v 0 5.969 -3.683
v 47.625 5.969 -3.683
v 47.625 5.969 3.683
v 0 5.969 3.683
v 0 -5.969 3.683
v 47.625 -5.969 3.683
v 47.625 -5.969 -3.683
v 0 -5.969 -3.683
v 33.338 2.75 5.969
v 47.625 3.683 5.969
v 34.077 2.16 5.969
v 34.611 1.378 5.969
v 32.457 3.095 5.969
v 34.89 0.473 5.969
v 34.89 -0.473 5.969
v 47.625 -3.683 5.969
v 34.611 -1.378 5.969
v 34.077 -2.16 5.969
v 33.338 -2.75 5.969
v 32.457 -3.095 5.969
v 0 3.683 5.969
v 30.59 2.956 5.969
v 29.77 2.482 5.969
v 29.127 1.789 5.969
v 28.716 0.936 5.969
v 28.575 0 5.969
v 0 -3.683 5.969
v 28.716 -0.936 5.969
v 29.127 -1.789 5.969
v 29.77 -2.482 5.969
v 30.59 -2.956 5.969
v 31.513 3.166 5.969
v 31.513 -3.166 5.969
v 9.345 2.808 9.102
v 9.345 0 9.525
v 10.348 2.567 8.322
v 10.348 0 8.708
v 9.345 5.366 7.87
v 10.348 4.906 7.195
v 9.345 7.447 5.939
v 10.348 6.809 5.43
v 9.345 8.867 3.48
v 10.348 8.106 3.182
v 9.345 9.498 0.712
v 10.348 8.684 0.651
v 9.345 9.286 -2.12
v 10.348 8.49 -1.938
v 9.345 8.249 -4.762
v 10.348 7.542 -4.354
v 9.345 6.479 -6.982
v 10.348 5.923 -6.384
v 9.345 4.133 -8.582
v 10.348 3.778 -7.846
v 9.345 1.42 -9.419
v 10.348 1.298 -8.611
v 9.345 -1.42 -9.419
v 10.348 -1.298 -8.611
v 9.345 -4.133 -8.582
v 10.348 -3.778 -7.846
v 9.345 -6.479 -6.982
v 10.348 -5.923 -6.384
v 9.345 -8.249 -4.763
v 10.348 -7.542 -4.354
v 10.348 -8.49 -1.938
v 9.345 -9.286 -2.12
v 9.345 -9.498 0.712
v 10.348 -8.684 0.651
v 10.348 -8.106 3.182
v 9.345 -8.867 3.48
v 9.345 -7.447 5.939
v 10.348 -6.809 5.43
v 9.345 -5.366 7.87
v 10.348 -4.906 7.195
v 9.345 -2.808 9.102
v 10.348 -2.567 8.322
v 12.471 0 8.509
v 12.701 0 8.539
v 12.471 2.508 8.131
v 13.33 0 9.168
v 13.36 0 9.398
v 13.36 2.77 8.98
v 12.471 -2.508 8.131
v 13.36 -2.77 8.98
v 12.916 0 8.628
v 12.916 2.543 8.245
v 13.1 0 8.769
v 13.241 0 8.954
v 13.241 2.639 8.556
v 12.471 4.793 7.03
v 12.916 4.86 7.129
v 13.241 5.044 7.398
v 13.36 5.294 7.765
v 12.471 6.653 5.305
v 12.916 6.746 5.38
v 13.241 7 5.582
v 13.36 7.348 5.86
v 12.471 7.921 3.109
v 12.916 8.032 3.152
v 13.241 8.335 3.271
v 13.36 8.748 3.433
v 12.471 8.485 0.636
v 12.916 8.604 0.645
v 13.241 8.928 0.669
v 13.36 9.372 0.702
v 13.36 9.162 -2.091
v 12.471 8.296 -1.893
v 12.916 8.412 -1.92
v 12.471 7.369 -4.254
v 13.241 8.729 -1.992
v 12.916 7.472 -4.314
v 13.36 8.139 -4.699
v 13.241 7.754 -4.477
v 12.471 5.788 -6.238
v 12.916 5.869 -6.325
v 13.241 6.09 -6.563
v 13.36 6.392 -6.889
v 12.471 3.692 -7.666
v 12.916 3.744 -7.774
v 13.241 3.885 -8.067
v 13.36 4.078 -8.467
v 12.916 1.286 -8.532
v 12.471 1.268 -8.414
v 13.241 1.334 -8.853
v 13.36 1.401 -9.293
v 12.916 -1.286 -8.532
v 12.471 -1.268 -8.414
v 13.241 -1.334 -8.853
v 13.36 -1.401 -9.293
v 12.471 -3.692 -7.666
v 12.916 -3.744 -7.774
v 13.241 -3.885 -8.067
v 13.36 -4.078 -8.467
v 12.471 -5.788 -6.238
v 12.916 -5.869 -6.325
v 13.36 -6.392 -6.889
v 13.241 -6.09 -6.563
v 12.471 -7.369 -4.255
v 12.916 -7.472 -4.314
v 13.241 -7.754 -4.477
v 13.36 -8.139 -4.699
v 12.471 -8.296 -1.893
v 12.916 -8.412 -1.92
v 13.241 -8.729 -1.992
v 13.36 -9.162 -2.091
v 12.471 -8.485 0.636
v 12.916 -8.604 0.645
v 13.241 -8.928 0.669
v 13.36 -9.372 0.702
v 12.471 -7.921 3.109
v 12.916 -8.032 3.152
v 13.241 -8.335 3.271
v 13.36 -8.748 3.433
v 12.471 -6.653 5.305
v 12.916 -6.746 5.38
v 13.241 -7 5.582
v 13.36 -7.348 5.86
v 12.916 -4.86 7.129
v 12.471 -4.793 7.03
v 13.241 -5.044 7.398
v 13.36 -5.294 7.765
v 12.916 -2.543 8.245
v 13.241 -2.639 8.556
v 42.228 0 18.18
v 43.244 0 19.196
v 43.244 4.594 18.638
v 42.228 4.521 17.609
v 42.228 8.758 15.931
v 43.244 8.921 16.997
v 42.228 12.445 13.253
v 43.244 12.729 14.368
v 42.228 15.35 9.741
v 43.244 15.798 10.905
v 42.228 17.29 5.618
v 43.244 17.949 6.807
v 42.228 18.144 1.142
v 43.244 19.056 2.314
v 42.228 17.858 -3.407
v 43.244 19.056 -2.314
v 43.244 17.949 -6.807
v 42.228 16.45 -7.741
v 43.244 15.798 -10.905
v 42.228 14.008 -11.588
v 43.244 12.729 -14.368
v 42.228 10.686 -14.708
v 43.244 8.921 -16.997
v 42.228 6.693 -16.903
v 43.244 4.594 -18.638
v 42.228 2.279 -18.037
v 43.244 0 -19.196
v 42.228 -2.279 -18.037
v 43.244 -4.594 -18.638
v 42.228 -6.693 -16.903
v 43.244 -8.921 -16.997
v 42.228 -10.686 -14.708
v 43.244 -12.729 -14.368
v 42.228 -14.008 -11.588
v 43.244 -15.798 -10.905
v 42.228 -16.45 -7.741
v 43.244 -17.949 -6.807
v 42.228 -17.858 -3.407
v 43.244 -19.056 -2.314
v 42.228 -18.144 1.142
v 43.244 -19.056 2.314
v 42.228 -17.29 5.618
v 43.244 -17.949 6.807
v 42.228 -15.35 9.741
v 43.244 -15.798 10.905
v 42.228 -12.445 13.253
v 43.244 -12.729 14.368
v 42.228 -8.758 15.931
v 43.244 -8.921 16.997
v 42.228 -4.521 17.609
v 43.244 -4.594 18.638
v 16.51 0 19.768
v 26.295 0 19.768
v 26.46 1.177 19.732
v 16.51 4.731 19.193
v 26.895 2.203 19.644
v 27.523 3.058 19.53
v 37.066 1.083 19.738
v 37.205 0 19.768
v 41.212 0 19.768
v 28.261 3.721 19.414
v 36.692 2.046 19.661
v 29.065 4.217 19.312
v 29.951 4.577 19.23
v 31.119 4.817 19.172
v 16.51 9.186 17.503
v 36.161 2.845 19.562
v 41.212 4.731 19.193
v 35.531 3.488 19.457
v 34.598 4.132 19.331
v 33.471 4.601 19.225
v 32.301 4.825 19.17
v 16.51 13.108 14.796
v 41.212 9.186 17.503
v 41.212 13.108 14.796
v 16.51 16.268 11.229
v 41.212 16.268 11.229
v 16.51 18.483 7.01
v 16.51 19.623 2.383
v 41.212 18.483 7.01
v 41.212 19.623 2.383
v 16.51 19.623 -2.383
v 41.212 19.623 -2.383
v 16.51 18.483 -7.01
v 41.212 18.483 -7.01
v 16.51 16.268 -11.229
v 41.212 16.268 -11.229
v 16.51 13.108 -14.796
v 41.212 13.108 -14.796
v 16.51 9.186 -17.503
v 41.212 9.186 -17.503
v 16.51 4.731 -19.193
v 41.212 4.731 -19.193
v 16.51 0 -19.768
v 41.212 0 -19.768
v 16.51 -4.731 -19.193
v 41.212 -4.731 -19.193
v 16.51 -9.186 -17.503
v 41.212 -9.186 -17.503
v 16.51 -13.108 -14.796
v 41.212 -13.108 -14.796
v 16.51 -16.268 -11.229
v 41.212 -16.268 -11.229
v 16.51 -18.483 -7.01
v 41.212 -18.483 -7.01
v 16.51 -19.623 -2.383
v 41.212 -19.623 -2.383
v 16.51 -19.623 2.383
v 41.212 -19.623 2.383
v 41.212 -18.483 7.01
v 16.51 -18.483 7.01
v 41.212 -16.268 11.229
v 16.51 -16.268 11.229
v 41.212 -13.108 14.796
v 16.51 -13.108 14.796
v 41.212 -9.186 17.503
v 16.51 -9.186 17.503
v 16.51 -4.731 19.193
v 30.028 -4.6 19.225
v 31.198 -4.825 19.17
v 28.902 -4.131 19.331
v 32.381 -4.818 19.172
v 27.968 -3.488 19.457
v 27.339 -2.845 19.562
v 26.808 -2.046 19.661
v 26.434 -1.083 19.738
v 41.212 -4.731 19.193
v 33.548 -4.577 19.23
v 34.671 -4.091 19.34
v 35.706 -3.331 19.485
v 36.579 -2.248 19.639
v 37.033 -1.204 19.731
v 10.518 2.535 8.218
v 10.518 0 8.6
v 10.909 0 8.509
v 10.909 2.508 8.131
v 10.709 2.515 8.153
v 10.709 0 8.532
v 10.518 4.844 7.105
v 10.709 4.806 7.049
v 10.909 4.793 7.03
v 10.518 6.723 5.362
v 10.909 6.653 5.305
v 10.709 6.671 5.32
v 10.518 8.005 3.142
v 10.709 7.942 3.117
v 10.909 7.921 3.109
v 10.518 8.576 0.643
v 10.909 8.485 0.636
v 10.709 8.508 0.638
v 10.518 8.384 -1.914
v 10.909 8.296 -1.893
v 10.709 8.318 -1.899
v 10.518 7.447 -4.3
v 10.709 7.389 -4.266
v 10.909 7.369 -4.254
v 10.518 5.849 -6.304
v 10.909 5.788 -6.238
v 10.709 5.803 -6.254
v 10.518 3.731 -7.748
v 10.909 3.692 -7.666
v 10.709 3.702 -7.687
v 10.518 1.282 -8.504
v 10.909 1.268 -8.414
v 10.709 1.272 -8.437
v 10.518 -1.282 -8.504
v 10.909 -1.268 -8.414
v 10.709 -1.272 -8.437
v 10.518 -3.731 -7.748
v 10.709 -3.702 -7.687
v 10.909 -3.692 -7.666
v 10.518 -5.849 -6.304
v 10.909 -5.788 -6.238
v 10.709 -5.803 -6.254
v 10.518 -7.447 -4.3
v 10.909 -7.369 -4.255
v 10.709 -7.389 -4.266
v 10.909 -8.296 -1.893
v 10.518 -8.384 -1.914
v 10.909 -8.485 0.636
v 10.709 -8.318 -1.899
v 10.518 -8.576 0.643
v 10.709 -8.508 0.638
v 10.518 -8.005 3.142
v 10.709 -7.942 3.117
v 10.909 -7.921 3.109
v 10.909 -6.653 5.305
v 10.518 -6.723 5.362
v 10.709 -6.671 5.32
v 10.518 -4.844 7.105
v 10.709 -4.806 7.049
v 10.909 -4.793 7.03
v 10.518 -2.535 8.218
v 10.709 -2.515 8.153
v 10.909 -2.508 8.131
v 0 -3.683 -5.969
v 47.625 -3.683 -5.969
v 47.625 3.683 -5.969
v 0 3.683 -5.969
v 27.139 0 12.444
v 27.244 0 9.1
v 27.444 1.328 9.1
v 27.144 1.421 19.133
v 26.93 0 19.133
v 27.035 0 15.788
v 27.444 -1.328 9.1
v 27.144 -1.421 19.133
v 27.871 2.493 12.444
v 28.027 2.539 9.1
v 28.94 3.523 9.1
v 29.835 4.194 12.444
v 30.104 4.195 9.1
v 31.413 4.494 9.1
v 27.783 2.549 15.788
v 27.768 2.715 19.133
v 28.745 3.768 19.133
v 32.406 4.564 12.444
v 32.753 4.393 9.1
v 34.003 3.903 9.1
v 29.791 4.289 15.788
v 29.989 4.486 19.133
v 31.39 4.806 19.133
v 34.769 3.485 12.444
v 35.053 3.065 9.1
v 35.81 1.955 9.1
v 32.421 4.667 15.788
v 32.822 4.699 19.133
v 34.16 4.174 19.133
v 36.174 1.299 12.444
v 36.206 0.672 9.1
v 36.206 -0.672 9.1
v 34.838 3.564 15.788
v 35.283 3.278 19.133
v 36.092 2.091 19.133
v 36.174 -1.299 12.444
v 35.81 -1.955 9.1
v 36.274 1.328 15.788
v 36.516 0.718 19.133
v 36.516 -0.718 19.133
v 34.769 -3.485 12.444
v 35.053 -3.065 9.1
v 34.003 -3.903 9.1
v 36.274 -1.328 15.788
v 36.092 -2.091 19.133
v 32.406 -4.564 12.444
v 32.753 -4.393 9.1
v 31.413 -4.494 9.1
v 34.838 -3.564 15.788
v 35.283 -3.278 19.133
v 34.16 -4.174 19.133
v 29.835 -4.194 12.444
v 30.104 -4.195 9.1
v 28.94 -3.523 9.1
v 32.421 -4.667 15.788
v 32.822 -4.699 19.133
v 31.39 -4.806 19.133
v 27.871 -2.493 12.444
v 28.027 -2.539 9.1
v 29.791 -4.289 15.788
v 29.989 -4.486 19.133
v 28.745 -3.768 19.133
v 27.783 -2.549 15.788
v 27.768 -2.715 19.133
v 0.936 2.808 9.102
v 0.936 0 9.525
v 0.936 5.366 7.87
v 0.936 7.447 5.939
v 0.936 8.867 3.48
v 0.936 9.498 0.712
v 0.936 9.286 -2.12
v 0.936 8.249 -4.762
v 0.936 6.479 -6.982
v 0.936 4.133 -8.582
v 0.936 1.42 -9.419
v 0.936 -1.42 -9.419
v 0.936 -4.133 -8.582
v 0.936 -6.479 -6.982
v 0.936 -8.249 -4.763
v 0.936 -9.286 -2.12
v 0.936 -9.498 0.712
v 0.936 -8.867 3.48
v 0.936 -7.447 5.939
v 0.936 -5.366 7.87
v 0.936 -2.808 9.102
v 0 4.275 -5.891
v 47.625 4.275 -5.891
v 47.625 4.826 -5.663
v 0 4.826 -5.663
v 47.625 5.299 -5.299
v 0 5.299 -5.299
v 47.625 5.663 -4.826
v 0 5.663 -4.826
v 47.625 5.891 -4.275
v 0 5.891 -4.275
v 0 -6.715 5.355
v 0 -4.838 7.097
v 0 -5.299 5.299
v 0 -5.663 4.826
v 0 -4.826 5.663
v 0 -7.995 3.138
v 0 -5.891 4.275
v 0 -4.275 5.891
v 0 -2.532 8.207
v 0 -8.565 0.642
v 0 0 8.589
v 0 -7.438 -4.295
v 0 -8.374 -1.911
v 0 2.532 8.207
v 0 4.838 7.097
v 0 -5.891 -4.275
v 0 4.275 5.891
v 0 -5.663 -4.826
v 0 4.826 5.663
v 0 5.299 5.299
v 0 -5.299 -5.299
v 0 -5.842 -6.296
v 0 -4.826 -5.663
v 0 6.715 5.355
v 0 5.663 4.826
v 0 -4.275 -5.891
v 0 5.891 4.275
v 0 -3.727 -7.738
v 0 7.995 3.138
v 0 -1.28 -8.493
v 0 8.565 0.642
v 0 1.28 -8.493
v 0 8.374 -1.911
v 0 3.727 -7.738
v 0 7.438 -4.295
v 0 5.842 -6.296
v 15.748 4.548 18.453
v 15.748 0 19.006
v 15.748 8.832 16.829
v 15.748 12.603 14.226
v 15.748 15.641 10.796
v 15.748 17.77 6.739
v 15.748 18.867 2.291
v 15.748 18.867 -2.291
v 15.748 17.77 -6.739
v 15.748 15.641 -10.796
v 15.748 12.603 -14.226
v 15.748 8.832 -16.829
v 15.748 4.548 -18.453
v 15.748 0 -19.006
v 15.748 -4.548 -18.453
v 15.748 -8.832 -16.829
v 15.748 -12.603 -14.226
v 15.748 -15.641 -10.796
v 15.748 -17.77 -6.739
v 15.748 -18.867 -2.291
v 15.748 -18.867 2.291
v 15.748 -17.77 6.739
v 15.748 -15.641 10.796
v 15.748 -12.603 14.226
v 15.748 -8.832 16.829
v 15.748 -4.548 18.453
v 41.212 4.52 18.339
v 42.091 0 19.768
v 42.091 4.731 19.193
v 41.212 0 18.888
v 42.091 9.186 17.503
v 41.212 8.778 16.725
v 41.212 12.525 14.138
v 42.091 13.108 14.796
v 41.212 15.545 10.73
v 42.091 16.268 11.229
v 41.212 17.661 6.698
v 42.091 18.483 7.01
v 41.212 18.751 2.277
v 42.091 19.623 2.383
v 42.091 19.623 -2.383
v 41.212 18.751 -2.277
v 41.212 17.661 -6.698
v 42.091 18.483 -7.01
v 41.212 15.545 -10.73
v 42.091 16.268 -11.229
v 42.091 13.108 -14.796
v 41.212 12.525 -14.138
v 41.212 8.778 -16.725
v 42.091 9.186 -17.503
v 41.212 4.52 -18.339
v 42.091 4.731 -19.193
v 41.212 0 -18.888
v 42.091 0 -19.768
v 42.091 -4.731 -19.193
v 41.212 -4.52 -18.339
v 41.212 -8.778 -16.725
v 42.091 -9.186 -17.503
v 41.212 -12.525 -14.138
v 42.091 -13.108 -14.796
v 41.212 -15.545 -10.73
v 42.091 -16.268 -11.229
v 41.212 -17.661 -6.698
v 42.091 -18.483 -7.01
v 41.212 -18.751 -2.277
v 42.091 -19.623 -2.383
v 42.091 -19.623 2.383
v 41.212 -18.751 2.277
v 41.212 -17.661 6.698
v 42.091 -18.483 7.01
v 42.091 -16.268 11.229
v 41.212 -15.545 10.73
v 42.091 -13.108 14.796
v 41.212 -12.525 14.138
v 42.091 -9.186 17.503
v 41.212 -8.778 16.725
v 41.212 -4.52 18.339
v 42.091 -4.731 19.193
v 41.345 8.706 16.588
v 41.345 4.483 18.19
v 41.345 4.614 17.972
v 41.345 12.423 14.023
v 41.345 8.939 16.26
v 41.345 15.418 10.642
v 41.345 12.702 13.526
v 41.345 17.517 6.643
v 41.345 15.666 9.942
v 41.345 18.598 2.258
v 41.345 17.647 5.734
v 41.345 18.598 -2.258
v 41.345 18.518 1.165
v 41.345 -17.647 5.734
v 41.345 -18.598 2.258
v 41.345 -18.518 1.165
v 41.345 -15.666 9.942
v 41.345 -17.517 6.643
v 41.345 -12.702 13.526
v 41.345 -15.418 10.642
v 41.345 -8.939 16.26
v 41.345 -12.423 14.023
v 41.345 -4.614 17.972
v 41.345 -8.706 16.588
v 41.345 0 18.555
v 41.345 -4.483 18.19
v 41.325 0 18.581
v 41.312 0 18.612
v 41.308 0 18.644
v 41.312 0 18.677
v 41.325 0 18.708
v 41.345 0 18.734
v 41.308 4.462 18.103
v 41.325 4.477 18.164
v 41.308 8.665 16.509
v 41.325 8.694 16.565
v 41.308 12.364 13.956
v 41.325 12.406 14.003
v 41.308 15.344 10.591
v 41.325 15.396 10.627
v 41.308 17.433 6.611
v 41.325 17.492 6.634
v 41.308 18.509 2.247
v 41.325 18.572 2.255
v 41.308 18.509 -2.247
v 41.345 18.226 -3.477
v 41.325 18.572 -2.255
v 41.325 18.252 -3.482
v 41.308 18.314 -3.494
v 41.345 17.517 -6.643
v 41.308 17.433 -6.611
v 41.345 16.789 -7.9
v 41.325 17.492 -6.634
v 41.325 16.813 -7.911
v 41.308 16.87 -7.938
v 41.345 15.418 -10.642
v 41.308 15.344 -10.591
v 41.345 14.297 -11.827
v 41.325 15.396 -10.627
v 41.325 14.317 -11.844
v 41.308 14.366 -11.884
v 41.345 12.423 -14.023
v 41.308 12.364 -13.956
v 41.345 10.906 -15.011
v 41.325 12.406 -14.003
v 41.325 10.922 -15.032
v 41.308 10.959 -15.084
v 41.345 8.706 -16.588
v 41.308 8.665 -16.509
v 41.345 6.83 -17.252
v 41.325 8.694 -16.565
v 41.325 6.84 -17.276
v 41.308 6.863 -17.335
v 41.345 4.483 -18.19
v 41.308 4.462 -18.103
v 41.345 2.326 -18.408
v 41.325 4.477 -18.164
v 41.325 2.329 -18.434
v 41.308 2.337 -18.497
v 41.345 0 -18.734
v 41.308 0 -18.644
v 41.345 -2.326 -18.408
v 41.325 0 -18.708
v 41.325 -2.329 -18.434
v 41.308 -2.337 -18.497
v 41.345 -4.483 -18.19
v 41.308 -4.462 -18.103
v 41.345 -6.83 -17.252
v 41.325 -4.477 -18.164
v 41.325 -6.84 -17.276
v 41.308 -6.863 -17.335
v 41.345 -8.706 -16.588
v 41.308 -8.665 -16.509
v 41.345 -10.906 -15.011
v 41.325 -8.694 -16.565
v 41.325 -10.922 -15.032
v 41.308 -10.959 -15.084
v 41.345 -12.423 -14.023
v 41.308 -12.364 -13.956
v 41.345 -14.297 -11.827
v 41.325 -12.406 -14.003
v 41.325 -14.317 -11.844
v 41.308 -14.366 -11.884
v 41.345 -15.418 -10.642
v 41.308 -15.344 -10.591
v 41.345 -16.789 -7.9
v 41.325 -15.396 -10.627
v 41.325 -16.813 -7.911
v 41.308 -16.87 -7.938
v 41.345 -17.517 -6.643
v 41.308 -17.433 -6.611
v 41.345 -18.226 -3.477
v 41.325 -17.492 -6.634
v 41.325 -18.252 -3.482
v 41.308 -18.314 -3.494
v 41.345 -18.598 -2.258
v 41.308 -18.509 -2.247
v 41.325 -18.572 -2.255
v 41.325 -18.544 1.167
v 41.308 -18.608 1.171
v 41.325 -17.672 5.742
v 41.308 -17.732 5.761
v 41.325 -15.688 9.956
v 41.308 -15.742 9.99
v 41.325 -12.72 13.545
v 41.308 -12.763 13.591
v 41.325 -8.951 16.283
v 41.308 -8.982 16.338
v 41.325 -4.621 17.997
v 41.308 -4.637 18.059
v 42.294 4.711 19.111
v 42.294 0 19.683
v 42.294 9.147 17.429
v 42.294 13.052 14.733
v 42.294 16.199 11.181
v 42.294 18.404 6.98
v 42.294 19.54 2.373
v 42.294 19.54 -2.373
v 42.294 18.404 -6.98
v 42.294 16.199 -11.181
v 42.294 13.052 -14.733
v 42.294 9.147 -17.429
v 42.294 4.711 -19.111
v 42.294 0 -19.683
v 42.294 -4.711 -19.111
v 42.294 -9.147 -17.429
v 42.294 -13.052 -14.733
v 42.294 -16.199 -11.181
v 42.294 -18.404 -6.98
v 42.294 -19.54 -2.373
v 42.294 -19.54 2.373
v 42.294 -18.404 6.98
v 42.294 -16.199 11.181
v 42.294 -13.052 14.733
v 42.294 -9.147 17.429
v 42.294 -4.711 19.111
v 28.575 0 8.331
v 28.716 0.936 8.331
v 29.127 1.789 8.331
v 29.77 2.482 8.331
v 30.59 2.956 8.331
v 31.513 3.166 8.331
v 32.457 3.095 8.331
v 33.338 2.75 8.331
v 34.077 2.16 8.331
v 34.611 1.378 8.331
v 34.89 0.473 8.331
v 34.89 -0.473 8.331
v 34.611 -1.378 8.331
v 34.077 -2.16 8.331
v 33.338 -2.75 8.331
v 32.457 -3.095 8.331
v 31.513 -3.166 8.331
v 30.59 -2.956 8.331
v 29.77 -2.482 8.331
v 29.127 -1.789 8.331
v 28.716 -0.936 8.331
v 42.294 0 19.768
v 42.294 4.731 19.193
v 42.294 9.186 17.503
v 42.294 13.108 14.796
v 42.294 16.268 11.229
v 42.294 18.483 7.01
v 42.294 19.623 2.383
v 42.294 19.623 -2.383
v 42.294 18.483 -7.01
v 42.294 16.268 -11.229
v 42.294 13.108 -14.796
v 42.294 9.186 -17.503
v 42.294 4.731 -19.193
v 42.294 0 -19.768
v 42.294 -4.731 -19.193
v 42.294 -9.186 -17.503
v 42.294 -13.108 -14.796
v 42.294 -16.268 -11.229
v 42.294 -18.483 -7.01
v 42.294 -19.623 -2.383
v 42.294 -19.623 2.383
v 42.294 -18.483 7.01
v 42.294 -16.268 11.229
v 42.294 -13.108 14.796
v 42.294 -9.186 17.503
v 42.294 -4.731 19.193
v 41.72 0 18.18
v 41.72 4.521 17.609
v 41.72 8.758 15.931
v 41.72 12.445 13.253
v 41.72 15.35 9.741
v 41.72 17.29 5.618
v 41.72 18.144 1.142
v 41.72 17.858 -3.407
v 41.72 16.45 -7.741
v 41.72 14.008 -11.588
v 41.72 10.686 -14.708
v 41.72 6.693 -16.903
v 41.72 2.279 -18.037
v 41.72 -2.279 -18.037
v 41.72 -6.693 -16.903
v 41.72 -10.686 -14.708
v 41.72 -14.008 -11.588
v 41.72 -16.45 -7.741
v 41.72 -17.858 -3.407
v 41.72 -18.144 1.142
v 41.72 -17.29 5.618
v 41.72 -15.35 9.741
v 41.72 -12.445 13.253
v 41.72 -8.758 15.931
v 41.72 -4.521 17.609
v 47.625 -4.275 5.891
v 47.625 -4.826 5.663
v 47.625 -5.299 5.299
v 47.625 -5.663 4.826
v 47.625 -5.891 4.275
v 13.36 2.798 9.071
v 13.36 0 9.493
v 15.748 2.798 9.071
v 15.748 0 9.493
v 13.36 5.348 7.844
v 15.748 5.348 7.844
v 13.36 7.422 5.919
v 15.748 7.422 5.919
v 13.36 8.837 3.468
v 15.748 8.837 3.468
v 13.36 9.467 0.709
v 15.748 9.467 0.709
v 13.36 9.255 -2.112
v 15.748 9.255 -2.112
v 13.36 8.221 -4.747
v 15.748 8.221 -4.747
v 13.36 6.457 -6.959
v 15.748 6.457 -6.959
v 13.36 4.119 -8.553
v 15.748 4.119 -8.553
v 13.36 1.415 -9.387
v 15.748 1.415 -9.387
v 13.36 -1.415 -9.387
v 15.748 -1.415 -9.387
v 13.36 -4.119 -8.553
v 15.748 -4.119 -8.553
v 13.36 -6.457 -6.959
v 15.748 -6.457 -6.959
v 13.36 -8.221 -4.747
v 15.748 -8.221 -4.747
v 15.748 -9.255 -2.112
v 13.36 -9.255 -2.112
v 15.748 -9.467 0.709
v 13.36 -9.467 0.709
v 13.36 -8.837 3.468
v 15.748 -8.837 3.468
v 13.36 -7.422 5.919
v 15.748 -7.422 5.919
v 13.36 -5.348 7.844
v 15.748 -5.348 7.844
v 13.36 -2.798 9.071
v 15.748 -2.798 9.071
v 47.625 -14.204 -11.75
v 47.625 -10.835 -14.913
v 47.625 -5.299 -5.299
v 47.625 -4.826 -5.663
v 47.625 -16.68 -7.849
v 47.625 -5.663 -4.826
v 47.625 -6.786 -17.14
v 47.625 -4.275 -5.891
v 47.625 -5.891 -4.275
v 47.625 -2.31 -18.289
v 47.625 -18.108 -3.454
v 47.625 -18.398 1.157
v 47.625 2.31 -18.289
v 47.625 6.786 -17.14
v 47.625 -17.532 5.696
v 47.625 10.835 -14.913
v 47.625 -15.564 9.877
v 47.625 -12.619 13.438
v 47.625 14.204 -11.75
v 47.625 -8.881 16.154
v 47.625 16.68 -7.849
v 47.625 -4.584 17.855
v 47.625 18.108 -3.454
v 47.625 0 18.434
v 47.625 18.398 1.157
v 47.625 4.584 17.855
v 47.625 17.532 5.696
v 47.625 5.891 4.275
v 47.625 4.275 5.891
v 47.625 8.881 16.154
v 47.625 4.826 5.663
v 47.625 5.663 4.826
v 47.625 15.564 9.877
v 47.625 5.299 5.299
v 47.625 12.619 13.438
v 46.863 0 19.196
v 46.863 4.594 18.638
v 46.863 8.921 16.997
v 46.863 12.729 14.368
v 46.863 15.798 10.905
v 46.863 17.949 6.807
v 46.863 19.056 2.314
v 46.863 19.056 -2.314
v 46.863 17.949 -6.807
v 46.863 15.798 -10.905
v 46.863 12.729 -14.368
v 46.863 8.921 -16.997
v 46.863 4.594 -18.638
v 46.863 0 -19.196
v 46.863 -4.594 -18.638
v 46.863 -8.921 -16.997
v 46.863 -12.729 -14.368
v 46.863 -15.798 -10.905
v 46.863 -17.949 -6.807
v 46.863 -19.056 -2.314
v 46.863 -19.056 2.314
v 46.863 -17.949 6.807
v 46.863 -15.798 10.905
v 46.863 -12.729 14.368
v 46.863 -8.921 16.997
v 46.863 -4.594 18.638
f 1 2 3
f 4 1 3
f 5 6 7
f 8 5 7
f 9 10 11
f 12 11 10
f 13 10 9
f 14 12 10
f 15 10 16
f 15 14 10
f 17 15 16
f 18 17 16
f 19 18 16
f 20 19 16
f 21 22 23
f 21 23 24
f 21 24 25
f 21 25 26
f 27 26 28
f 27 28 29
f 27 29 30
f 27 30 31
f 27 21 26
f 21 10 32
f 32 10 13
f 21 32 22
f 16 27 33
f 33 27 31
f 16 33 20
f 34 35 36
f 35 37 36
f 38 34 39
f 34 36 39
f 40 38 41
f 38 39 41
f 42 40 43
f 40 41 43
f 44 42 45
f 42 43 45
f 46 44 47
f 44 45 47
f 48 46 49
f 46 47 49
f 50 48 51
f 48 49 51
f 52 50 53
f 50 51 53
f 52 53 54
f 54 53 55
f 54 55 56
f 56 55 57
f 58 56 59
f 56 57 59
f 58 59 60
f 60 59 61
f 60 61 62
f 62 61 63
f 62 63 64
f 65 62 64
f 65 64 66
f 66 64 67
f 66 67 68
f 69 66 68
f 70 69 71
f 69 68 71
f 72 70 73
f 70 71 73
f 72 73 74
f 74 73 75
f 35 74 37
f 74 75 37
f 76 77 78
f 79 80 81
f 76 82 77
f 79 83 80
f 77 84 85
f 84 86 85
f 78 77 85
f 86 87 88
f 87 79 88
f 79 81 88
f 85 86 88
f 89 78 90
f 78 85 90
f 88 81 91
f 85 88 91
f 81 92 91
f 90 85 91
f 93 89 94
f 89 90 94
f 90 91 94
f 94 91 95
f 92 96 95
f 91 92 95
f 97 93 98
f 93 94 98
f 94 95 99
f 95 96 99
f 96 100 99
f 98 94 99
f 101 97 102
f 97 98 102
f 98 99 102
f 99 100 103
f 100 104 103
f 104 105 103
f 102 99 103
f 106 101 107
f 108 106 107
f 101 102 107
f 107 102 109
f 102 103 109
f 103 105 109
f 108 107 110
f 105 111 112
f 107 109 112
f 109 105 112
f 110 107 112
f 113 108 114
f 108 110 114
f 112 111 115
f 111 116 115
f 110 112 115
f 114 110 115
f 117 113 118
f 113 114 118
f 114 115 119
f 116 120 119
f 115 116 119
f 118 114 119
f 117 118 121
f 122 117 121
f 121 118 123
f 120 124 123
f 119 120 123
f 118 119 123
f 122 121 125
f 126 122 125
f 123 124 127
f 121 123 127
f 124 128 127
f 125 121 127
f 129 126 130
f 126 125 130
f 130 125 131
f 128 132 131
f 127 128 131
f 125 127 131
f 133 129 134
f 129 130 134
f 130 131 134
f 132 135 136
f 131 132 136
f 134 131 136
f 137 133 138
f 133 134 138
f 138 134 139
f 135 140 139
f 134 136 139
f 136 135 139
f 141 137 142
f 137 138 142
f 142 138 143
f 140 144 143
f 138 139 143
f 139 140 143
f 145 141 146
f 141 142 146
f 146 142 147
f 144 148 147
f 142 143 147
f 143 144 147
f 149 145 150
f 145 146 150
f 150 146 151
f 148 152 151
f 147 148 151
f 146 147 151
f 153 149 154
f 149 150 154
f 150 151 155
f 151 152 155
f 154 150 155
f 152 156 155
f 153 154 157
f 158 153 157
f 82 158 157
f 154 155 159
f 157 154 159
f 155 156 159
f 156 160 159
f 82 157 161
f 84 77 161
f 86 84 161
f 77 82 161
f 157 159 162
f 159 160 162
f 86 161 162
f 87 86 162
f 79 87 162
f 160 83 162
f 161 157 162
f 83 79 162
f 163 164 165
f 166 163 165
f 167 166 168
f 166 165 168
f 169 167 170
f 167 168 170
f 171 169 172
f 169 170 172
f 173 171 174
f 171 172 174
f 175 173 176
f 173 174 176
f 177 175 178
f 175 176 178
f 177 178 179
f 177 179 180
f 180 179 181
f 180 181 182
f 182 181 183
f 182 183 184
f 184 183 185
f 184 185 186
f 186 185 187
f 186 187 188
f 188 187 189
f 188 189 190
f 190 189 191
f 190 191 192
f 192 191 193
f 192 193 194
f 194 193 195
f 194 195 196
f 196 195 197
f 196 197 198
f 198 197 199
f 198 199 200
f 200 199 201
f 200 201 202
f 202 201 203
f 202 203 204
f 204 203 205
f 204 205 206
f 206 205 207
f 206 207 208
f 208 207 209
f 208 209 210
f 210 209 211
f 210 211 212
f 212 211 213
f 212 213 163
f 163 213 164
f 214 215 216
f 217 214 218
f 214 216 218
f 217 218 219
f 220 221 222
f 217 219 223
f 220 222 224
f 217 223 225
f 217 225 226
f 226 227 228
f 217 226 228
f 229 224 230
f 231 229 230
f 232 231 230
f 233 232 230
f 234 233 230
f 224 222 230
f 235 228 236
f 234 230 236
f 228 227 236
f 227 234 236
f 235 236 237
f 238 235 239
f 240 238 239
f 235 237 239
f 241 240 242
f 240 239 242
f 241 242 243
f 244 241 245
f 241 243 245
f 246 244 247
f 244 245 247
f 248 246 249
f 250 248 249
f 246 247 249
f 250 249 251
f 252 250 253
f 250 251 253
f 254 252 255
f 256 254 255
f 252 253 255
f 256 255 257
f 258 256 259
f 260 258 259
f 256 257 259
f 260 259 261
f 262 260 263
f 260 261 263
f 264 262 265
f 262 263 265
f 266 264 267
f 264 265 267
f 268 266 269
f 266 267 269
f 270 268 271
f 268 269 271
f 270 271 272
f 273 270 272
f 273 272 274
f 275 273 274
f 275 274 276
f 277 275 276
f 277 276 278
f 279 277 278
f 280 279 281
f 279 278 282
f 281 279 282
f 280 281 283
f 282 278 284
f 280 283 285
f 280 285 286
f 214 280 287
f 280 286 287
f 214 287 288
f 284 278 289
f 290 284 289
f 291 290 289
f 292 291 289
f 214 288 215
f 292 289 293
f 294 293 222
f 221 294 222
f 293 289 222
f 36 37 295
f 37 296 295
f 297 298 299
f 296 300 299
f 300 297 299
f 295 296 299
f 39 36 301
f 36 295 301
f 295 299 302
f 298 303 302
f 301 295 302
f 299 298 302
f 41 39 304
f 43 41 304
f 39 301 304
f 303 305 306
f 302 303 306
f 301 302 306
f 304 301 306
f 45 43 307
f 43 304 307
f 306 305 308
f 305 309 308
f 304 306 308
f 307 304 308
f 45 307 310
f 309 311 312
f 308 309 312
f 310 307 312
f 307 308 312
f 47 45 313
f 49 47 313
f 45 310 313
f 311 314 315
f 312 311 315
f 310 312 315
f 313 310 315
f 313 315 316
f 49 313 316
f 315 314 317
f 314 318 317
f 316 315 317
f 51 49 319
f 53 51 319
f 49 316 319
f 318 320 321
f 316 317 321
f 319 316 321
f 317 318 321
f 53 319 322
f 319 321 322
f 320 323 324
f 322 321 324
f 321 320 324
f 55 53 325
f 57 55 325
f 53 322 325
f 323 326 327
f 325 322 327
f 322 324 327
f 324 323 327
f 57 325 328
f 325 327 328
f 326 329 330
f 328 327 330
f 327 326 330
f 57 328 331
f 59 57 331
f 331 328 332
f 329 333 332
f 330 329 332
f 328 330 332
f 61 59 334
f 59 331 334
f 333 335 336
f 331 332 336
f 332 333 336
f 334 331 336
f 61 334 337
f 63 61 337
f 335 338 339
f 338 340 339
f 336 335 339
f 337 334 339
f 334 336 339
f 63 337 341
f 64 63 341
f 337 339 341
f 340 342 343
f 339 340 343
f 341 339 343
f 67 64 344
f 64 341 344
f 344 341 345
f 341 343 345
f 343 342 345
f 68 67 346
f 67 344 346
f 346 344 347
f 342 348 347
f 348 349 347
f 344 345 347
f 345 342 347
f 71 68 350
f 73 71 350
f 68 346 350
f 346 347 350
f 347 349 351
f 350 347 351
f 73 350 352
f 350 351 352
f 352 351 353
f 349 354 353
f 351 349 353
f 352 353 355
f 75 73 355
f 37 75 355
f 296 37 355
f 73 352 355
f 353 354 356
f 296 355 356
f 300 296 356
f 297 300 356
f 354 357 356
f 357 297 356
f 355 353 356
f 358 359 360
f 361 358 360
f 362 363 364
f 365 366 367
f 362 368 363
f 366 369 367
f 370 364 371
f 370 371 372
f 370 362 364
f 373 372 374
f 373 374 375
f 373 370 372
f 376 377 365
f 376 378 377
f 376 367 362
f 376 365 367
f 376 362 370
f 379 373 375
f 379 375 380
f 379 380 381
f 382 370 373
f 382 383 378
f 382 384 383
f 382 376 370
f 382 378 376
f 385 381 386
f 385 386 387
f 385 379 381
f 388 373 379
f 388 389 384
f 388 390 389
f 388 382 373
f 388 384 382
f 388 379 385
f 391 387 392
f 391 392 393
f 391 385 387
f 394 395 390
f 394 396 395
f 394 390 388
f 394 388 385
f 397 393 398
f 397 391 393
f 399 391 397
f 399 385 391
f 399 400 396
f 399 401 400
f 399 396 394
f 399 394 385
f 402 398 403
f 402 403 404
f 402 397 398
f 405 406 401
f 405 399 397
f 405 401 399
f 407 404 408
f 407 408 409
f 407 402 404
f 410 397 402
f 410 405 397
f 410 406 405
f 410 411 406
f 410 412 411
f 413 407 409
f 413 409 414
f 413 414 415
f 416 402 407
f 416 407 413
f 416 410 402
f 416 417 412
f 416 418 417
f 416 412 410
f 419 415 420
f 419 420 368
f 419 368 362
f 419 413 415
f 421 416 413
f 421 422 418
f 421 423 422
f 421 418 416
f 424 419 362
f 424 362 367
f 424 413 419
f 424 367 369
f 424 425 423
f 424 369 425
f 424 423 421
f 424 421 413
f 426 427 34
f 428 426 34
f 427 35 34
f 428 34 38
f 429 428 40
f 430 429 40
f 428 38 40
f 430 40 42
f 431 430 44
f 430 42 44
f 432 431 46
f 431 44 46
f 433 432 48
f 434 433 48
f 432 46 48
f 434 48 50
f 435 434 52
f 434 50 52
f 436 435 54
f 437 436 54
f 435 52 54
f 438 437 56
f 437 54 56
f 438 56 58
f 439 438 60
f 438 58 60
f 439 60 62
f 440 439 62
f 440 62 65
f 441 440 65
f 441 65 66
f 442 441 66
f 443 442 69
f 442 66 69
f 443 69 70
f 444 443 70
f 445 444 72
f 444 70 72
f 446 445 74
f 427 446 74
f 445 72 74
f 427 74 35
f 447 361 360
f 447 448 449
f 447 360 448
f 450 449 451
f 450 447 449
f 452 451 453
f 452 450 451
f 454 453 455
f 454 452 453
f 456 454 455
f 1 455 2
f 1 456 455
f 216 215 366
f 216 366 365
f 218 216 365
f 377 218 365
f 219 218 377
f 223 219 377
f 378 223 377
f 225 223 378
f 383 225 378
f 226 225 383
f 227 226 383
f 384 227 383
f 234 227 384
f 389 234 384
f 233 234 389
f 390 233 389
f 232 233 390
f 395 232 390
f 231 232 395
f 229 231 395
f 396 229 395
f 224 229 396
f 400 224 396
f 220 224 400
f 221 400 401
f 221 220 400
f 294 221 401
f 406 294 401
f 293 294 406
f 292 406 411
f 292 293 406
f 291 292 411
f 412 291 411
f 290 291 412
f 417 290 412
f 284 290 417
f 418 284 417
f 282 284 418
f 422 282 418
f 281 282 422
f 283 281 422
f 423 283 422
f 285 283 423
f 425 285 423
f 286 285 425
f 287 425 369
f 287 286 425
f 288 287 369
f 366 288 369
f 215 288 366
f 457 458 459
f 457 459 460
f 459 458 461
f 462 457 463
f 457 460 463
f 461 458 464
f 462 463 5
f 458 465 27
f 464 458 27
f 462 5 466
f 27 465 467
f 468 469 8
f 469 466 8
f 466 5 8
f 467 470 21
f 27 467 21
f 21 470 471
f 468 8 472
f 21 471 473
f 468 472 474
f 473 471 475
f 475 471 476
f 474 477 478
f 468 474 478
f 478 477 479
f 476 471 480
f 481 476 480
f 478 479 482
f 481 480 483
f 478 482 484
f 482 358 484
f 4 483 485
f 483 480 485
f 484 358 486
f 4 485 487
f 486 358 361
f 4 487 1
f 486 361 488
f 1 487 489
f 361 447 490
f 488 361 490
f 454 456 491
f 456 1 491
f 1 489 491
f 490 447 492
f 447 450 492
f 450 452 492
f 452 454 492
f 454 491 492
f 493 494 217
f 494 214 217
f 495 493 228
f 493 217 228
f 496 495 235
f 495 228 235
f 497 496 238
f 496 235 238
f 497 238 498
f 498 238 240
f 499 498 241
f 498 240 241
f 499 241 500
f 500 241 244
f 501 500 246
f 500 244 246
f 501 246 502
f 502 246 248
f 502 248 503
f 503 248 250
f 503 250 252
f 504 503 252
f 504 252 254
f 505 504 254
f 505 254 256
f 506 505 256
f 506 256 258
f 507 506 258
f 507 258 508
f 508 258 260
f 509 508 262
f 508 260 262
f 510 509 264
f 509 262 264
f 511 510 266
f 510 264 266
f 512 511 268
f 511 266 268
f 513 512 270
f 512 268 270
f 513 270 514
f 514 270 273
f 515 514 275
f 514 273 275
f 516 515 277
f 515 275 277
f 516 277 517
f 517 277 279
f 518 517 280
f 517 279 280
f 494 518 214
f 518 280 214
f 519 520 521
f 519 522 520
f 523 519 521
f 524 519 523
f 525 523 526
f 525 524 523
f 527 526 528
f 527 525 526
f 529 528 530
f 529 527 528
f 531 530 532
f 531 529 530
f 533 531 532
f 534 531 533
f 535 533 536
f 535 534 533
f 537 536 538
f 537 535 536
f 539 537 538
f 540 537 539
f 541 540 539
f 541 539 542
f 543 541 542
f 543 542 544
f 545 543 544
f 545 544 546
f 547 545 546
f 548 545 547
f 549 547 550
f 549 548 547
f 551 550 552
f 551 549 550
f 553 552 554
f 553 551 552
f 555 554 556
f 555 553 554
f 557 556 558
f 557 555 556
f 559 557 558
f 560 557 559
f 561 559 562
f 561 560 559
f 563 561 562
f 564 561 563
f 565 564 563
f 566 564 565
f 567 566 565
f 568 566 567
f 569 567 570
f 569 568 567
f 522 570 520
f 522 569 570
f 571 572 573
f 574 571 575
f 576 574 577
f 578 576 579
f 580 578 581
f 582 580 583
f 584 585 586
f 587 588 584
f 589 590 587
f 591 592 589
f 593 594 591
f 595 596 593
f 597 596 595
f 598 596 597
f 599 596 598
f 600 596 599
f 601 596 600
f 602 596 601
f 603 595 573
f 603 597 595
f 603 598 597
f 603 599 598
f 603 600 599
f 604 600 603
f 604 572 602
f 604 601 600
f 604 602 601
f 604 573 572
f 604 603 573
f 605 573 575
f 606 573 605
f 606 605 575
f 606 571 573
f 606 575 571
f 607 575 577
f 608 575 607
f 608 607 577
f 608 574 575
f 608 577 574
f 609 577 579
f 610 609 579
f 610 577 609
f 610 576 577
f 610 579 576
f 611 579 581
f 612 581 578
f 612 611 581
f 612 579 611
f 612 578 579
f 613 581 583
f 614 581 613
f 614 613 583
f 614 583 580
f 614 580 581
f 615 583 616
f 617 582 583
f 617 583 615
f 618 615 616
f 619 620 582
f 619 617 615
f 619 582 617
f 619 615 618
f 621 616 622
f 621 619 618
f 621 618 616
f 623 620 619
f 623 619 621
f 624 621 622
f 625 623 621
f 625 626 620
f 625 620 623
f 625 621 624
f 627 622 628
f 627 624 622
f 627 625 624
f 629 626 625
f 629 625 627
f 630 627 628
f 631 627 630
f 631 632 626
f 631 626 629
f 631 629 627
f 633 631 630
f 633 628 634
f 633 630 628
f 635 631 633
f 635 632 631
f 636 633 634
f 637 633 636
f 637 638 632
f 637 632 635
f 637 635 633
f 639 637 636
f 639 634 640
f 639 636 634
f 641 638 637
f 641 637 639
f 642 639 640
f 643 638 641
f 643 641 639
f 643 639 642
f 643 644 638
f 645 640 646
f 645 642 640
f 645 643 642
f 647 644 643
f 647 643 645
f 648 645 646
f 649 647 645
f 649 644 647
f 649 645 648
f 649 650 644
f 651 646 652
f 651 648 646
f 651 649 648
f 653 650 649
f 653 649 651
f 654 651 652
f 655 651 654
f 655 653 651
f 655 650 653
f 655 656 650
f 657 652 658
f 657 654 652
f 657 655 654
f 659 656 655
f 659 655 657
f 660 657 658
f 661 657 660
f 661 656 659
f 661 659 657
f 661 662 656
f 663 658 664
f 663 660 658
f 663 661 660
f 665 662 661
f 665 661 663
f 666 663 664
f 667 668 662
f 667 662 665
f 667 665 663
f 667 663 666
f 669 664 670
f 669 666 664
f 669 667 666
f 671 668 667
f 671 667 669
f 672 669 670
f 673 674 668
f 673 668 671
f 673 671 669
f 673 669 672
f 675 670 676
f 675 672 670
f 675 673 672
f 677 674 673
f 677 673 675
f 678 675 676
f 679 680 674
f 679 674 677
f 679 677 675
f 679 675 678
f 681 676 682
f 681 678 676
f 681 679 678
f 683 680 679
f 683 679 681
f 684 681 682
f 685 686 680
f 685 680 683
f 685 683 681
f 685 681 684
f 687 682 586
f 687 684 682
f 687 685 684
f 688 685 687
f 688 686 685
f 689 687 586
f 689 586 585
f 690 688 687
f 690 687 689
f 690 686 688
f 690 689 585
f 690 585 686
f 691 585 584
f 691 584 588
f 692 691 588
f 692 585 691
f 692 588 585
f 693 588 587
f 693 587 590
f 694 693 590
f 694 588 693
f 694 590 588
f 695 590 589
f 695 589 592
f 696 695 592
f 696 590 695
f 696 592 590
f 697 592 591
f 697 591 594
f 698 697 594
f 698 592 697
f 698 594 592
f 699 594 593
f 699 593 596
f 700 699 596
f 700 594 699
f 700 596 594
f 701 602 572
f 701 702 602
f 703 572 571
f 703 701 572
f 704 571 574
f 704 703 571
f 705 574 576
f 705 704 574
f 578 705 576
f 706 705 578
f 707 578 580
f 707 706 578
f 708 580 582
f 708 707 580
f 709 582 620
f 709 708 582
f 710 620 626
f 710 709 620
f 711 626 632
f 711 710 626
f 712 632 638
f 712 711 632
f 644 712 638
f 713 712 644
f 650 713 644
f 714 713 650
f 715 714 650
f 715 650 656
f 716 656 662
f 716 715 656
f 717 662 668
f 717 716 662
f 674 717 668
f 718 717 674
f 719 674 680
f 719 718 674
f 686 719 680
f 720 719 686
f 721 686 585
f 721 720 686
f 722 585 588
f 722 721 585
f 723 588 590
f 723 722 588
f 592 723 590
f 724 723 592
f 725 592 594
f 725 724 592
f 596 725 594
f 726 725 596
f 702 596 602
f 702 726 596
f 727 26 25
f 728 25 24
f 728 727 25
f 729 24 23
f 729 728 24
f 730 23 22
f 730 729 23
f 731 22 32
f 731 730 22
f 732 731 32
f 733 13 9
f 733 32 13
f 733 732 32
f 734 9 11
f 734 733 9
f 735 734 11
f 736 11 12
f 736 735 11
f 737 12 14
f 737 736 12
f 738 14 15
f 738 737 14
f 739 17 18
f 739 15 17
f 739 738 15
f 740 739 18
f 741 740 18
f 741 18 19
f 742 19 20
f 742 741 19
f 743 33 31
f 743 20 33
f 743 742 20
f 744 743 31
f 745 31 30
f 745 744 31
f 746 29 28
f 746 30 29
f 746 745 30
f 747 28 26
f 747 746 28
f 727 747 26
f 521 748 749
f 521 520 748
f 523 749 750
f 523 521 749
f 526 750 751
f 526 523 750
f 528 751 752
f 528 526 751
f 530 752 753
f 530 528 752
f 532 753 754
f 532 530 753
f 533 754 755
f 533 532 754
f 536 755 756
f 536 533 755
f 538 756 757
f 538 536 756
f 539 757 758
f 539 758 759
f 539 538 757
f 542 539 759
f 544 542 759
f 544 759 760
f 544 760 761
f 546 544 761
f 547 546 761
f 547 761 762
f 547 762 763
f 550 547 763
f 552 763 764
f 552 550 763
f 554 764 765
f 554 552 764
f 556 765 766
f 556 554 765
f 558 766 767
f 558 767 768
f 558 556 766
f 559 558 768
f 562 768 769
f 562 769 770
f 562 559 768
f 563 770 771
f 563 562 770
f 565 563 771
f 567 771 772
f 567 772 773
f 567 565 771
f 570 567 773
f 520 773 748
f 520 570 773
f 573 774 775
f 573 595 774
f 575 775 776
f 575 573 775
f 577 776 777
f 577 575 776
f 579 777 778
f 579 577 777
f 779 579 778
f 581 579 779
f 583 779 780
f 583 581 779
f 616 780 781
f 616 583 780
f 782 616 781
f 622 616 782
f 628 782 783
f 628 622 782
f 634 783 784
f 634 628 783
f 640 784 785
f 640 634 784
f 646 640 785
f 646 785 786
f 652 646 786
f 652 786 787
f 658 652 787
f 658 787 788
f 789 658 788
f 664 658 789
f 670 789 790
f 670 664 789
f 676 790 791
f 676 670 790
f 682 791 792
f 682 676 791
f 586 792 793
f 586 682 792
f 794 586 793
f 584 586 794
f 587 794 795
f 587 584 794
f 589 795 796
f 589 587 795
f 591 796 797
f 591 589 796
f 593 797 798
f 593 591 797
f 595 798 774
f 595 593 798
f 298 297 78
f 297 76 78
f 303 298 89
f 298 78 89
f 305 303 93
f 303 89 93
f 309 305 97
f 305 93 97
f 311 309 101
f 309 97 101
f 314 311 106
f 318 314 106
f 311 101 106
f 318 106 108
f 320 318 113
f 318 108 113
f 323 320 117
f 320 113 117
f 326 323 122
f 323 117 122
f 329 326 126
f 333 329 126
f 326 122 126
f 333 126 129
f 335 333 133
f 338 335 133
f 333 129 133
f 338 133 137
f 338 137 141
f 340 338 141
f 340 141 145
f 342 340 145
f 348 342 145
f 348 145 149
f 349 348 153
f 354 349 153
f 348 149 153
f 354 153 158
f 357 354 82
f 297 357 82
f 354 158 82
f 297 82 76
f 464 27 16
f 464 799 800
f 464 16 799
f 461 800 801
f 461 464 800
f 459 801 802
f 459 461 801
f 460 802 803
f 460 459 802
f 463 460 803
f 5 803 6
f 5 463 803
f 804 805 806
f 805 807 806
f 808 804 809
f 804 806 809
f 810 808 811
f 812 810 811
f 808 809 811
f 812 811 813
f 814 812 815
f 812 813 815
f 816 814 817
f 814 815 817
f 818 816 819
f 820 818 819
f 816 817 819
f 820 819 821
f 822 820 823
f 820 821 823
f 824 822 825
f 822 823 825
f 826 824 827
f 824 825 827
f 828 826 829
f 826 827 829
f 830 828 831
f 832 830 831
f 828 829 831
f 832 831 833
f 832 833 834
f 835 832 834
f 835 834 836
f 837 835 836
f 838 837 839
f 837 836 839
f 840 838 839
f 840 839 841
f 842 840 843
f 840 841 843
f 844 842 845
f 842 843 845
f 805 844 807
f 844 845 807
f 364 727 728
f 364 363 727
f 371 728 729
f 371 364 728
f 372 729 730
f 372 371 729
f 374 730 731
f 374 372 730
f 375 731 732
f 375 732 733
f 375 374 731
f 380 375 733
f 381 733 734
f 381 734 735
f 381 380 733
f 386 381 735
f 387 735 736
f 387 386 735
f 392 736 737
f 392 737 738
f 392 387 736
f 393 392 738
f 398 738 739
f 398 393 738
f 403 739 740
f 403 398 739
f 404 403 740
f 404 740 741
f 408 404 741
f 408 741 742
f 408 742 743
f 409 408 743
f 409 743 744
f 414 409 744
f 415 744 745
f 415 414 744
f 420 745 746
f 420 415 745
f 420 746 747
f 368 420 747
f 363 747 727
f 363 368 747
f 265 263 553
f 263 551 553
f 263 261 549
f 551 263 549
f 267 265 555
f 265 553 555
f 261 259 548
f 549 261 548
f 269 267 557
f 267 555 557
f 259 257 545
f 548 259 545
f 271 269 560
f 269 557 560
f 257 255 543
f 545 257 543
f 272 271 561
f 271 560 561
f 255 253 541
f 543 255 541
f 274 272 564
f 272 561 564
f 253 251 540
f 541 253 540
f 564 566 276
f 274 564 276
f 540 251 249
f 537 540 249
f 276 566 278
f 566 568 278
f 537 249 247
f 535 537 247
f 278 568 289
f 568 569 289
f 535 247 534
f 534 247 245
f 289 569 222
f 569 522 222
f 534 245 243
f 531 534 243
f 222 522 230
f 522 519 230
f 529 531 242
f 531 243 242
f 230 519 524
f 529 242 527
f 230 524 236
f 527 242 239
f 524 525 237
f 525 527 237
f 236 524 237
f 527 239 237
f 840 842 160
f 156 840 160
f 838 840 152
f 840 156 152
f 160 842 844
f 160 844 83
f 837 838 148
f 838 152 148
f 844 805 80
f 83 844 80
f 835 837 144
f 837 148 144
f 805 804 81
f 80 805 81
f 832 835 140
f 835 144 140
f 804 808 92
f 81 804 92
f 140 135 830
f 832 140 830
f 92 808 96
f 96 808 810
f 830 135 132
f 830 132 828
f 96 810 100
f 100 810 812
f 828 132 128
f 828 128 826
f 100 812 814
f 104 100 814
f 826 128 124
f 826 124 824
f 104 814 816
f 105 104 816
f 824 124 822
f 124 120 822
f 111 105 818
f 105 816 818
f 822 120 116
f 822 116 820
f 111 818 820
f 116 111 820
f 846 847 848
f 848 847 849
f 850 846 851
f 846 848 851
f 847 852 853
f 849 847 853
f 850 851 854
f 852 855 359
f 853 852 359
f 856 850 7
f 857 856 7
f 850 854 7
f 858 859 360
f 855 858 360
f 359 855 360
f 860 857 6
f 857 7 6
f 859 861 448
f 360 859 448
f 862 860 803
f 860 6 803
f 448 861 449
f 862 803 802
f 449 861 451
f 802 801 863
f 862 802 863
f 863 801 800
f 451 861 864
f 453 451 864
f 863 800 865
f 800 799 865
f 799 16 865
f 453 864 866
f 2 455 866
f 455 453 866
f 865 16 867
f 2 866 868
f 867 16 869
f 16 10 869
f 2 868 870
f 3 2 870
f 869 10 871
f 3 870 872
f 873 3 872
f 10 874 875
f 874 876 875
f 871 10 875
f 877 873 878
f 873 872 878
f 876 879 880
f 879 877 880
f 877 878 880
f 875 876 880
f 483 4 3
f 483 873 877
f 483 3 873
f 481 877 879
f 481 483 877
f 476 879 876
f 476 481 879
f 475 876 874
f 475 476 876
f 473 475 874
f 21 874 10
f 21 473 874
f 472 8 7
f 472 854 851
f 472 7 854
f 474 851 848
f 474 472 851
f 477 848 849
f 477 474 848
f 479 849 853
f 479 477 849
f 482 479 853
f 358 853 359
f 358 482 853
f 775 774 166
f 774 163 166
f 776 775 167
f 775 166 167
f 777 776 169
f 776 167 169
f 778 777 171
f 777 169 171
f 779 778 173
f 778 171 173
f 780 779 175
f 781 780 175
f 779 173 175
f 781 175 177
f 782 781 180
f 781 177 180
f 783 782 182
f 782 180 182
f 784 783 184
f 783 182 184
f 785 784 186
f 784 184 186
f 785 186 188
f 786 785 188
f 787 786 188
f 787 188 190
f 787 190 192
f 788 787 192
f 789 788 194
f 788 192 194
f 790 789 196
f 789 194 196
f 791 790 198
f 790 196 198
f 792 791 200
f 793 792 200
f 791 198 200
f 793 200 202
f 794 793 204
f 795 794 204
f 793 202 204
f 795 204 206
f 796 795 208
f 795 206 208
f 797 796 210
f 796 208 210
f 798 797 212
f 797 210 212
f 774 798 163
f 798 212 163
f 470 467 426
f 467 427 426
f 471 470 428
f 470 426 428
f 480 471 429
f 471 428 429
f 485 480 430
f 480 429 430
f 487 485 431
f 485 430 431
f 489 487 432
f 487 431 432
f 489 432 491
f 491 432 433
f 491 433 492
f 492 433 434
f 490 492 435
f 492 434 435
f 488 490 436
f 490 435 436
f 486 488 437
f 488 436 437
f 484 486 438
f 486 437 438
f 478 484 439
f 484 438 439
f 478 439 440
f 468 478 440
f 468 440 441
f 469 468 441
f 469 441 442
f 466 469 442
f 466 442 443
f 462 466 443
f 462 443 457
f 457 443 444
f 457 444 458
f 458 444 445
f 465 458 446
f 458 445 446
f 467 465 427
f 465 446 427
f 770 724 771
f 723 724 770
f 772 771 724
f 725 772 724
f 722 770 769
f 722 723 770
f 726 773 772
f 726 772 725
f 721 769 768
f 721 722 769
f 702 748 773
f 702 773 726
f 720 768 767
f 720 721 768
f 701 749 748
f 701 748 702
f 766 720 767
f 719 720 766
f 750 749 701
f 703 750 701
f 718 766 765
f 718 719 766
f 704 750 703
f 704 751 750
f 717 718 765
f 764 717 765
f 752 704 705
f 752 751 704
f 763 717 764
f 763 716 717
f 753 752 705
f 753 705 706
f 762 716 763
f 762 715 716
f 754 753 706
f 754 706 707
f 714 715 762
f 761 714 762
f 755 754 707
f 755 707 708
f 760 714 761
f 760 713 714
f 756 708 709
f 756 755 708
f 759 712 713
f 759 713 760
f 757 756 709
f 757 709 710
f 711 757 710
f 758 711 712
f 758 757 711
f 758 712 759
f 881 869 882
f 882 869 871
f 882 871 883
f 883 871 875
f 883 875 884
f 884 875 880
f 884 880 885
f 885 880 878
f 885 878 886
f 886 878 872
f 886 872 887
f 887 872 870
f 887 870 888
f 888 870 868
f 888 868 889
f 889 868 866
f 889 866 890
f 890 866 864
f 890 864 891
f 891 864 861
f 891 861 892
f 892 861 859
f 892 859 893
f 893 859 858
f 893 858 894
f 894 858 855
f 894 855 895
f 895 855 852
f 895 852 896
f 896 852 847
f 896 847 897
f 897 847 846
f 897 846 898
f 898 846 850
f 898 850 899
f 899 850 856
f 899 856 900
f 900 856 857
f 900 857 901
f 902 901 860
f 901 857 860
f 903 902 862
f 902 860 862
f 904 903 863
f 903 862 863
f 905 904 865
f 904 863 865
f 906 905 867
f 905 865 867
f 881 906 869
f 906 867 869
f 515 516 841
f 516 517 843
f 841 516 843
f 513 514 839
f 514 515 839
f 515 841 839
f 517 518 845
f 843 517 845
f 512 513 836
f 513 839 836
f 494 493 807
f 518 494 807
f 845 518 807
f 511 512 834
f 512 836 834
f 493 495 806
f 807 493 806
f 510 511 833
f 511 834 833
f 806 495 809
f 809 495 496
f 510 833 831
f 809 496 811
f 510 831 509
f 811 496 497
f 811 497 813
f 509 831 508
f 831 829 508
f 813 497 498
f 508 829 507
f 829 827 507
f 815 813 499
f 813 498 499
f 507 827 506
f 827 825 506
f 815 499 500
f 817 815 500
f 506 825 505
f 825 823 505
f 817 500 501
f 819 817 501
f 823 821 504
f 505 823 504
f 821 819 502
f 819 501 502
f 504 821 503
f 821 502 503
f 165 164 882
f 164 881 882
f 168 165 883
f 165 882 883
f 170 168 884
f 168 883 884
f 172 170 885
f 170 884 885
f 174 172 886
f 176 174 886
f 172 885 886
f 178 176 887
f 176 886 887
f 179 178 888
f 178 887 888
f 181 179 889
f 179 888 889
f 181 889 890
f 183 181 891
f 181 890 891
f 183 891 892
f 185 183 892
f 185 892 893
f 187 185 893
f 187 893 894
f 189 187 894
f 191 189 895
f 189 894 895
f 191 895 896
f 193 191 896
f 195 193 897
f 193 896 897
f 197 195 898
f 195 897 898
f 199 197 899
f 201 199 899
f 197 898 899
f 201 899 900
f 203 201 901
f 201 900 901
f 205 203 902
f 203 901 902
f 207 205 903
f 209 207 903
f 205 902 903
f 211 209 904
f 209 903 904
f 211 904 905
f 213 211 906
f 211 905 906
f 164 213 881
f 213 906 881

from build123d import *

# Parameters (mm, degrees)
CUT_EXTRUDE1_DEPTH = 95.25


with BuildPart() as part:
    # Sketch1 → Revolve1 (revolve)
    with BuildSketch(Plane.XY):
        with BuildLine():
            Line((0, 0), (0, 8.58901))
            Line((0, 8.58901), (0.93599, 9.525))
            Line((0.93599, 9.525), (9.344692072, 9.525))
            Line((9.344692072, 9.525), (10.348204118, 8.708440423))
            ThreePointArc((10.348204118, 8.708440423), (10.611556372, 8.560342712), (10.9093, 8.509))
            Line((10.9093, 8.509), (12.4714, 8.509))
            ThreePointArc((12.4714, 8.509), (13.100017928, 8.769382072), (13.3604, 9.398))
            Line((13.3604, 9.398), (13.3604, 9.49325))
            Line((13.3604, 9.49325), (15.748, 9.49325))
            Line((15.748, 9.49325), (15.748, 0))
            Line((15.748, 0), (0, 0))
        make_face()
    revolve(axis=Axis((15.748, 0, 0), (-1, 0, 0)))

    # Sketch2 → Revolve2 (revolve)
    with BuildSketch(Plane.XY):
        Polygon((15.748, 0), (15.748, 19.00555), (16.51, 19.76755), (41.2115, 19.76755), (41.2115, 18.18005), (42.2275, 18.18005), (43.2435, 19.19605), (46.863, 19.19605), (47.625, 18.43405), (47.625, 0), align=None)
    revolve(axis=Axis((47.625, 0, 0), (-1, 0, 0)))

    # Sketch3 → Cut-Revolve1 (revolve, cut)
    with BuildSketch(Plane(origin=(0, 0, 0), x_dir=(1, 0, 0), z_dir=(0, 1, 0))):
        Polygon((31.75, 0), (34.925, 0), (34.925, -8.330850926), (36.256425852, -9.09955), (36.569651116, -19.132537191), (37.204663925, -19.76755), (31.75, -19.76755), align=None)
    revolve(axis=Axis((31.75, 0, 19.76755), (0, 0, -1)), mode=Mode.SUBTRACT)

    # Sketch4 → Revolve3 (revolve)
    with BuildSketch(Plane.XY):
        with BuildLine():
            Line((41.2115, 17.92605), (42.2275, 17.92605))
            Line((42.2275, 17.92605), (42.2275, 18.18005))
            Line((42.2275, 18.18005), (41.7195, 18.18005))
            Line((41.7195, 18.18005), (41.344882072, 18.554667928))
            ThreePointArc((41.344882072, 18.554667928), (41.307684633, 18.64447049), (41.344882072, 18.734273051))
            Line((41.344882072, 18.734273051), (42.293990825, 19.683381804))
            Line((42.293990825, 19.683381804), (42.293990825, 19.76755))
            Line((42.293990825, 19.76755), (42.090790825, 19.76755))
            Line((42.090790825, 19.76755), (41.2115, 18.888259175))
            Line((41.2115, 18.888259175), (41.2115, 17.92605))
        make_face()
    revolve(axis=Axis((42.2275, 0, 0), (-1, 0, 0)))

    # Sketch5 → Cut-Extrude1 (cut)
    with BuildSketch(Plane(origin=(0, 0, 0), x_dir=(0, 0, -1), z_dir=(1, 0, 0))):
        with BuildLine():
            Line((-5.969, 3.683), (-5.969, -3.683))
            ThreePointArc((-5.969, -3.683), (-5.299446102, -5.299446102), (-3.683, -5.969))
            Line((-3.683, -5.969), (3.683, -5.969))
            ThreePointArc((3.683, -5.969), (5.299446102, -5.299446102), (5.969, -3.683))
            Line((5.969, -3.683), (5.969, 3.683))
            ThreePointArc((5.969, 3.683), (5.299446102, 5.299446102), (3.683, 5.969))
            Line((3.683, 5.969), (-3.683, 5.969))
            ThreePointArc((-3.683, 5.969), (-5.299446102, 5.299446102), (-5.969, 3.683))
        make_face()
    extrude(amount=CUT_EXTRUDE1_DEPTH, mode=Mode.SUBTRACT)


solid = part.part
